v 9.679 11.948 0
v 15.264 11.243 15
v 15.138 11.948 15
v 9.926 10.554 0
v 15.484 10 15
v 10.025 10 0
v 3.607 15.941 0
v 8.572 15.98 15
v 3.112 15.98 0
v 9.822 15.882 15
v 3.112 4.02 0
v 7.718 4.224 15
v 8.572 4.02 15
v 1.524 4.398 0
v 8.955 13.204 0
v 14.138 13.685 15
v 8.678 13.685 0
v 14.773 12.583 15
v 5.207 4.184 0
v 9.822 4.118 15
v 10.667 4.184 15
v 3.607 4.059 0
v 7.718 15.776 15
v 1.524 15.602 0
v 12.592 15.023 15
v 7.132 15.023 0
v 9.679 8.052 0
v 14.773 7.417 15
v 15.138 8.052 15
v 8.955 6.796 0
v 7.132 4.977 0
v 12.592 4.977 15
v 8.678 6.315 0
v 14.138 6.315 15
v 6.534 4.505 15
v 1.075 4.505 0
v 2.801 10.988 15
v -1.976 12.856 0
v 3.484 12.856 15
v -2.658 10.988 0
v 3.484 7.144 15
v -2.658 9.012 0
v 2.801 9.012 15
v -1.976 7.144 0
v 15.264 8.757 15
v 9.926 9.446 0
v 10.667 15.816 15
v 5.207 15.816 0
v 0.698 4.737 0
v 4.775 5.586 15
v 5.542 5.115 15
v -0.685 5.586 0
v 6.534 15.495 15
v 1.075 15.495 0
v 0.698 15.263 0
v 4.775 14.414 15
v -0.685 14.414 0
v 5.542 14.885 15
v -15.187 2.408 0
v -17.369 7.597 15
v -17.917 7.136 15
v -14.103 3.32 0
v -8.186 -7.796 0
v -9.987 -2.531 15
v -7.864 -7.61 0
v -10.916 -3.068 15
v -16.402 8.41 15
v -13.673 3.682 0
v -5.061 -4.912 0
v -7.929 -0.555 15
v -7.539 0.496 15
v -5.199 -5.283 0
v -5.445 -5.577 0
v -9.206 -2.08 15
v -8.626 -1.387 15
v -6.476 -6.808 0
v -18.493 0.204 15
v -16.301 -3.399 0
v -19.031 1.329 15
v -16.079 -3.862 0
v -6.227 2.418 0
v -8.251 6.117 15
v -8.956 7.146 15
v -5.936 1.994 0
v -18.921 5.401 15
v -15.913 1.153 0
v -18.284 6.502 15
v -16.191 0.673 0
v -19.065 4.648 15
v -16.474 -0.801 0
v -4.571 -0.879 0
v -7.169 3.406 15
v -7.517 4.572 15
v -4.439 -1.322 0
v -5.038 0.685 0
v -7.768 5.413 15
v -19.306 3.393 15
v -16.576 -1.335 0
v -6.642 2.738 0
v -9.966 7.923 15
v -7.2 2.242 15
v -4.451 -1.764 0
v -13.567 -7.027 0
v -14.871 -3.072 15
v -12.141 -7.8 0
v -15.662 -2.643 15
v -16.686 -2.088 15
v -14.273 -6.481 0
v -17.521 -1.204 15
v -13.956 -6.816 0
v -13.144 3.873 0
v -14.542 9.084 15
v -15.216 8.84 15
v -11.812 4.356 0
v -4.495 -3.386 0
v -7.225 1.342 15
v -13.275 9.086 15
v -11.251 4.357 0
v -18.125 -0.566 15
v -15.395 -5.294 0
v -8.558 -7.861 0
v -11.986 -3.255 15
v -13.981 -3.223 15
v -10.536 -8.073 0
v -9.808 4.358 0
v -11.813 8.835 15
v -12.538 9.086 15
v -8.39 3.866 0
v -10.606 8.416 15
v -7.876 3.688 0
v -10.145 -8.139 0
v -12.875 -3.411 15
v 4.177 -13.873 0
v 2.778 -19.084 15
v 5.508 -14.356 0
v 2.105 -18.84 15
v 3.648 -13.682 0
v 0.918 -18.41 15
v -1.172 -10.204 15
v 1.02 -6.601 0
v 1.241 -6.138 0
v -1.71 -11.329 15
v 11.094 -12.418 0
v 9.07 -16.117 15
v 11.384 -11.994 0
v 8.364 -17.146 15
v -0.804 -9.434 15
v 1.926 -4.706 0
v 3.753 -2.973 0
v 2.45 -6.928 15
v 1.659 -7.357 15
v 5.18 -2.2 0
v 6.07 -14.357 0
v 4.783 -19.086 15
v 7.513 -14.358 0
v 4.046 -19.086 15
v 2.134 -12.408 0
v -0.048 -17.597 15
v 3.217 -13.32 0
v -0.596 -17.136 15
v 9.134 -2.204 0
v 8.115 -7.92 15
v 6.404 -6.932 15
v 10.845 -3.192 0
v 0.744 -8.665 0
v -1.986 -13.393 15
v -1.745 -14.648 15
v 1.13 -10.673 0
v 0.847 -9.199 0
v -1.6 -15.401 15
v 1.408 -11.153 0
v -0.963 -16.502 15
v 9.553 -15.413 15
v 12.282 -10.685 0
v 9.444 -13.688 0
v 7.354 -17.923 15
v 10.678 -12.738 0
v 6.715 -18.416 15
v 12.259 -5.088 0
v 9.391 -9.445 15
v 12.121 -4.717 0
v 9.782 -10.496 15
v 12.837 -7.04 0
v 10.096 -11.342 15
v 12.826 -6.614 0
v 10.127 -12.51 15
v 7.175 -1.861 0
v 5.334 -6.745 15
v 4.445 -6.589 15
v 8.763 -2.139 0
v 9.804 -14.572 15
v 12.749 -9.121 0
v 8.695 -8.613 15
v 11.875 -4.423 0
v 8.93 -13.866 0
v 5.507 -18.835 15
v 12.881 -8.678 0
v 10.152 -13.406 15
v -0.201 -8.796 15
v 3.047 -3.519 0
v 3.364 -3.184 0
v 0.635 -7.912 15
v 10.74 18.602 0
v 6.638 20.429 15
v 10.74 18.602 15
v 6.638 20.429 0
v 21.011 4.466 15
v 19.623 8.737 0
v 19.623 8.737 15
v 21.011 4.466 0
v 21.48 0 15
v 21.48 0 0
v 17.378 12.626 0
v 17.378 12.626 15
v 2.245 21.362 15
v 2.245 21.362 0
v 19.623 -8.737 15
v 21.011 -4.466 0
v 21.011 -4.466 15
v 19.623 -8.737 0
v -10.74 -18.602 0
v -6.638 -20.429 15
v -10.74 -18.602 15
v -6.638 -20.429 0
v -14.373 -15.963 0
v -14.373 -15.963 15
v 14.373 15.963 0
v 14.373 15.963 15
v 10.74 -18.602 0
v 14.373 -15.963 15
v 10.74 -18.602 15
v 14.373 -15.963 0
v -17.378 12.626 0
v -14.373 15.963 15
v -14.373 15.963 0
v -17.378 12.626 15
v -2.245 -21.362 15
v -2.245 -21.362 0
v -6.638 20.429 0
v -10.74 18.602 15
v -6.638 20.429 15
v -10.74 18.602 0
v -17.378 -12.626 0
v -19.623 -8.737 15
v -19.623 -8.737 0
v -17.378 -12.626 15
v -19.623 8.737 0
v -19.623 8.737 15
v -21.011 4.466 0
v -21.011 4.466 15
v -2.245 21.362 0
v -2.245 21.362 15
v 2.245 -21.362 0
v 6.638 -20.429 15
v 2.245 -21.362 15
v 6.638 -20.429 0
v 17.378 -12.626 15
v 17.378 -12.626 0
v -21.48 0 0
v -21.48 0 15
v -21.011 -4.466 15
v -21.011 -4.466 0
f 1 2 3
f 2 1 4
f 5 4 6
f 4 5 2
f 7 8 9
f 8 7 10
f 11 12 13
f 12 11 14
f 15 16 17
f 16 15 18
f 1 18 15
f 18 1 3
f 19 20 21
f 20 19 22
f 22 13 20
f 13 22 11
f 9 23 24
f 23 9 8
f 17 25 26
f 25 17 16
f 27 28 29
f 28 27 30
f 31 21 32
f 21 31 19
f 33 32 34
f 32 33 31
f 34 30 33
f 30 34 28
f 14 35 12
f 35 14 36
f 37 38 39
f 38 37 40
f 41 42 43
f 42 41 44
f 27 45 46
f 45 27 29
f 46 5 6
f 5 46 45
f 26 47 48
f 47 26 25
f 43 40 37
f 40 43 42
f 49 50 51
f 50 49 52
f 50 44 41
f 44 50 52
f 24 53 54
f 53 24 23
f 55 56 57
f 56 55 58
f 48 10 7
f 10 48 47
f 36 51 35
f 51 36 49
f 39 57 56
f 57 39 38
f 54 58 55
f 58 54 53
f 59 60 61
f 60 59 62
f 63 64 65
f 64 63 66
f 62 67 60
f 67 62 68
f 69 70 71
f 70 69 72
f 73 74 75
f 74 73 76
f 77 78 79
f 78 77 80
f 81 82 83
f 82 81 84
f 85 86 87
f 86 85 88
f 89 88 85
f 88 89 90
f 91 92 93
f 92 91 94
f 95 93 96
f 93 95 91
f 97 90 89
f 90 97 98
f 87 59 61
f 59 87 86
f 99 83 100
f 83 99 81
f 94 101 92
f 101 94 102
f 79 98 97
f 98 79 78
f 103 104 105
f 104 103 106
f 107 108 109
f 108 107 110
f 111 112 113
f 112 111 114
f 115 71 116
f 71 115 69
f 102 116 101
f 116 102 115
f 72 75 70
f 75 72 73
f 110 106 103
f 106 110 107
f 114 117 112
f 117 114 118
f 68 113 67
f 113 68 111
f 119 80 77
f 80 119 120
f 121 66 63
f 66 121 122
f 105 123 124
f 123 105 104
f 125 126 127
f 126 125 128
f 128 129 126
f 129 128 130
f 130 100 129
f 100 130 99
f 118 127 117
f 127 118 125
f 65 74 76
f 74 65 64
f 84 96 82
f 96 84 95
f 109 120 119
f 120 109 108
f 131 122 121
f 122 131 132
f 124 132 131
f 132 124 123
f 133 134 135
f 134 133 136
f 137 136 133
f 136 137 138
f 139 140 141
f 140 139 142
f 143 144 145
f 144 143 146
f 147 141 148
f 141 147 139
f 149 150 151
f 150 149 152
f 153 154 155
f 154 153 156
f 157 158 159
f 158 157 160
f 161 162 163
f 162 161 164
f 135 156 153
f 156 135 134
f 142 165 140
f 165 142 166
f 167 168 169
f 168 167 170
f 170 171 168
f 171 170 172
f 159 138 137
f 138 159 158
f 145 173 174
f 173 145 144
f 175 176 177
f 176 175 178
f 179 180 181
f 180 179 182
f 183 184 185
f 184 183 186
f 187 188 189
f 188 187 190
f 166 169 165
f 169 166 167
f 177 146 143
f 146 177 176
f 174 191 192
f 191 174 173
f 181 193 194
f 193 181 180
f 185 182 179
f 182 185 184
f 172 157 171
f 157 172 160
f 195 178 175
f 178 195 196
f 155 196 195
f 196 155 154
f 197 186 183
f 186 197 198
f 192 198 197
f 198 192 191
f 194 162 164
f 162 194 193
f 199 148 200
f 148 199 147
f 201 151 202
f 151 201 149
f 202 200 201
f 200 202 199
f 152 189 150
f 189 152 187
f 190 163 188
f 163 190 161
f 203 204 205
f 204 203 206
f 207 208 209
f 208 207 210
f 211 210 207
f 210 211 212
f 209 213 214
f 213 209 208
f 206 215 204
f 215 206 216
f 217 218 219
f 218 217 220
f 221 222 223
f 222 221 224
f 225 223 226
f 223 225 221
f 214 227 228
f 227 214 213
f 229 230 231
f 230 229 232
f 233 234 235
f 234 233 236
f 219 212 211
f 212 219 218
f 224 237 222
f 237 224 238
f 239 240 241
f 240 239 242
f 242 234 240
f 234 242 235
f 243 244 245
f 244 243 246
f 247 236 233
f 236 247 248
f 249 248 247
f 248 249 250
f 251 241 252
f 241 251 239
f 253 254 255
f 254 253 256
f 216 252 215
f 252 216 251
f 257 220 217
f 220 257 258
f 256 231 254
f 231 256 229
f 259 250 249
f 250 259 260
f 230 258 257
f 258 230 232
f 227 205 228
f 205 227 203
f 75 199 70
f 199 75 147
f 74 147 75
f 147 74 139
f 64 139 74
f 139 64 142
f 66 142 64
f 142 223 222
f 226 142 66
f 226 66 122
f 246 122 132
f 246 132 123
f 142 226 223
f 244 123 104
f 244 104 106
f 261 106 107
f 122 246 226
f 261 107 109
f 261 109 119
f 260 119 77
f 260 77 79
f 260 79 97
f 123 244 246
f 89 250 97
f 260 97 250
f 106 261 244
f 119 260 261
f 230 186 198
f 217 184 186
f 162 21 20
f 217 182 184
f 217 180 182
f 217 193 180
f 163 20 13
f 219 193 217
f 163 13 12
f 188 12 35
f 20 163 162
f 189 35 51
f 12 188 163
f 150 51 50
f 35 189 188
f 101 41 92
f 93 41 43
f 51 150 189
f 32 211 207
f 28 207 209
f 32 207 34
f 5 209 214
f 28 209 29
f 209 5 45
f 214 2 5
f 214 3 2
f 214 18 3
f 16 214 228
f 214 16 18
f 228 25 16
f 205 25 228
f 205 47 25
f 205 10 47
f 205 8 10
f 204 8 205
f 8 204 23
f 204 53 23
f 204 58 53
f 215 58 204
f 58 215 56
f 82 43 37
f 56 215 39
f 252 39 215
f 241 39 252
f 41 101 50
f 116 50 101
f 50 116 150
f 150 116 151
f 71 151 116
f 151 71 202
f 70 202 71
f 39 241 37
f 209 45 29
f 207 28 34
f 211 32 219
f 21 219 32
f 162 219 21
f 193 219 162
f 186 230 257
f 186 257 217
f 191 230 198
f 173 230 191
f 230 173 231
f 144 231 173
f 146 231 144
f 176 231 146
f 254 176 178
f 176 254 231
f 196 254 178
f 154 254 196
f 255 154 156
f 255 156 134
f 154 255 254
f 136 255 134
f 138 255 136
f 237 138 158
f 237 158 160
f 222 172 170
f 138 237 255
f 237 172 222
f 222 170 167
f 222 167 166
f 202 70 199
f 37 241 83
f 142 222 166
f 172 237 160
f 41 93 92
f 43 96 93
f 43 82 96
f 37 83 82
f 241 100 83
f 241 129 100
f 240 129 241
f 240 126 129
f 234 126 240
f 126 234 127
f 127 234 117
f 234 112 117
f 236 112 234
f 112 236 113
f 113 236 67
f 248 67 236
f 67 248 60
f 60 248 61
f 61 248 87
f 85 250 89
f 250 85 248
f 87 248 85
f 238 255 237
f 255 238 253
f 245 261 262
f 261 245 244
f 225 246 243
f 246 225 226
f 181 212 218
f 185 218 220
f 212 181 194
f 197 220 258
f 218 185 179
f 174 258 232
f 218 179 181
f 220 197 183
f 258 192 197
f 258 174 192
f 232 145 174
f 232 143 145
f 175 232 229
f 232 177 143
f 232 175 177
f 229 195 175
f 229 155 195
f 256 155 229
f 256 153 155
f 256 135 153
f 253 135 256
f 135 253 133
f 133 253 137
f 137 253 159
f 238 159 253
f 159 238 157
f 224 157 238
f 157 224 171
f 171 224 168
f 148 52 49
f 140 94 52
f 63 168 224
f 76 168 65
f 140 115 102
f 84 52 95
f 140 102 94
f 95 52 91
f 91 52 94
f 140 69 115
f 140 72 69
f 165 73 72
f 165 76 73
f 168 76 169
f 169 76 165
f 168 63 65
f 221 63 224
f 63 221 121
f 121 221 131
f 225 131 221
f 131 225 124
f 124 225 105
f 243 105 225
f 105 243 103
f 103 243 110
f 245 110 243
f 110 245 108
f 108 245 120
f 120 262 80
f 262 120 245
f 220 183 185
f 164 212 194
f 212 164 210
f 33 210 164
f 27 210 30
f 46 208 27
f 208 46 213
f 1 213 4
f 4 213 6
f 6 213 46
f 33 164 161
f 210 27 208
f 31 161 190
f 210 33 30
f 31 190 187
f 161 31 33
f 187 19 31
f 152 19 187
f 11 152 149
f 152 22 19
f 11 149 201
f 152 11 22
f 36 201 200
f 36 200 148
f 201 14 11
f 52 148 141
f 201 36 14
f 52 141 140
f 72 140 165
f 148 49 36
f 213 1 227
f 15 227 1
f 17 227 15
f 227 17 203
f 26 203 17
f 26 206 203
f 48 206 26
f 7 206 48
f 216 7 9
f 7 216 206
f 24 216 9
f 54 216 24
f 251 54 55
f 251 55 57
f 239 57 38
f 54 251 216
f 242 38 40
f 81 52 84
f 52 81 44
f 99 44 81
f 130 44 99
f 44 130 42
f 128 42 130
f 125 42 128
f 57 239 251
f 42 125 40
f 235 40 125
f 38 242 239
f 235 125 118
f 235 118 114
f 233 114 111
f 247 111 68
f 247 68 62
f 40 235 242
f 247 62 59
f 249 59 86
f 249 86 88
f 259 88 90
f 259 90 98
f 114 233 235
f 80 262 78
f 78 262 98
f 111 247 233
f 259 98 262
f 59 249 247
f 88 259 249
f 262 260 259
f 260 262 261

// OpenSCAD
number_of_holes=3; // [2:6]
hole_Angle=20; // [0:40]
hole_Size=12;
thickness=15;
additional_gerth=0;



divider=360/number_of_holes;
holeRadius=hole_Size/2;

if (hole_Angle > 20) 
{
  printitem(hole_Angle-20);
} else {
  printitem(0);
}






module printitem(invar) {
	pieceSize=(hole_Size*3.33)+number_of_holes+invar+additional_gerth;
	pieceRadius=pieceSize/2;
	difference(){
		cylinder(r=pieceRadius,h=thickness);
		for (a=[0:number_of_holes-1]) {
			rotate([0,0,divider*a])translate([0,hole_Size-(5-number_of_holes),-10])rotate([0,hole_Angle,0])cylinder(r=holeRadius,h=thickness*3);
		}

	}
}
